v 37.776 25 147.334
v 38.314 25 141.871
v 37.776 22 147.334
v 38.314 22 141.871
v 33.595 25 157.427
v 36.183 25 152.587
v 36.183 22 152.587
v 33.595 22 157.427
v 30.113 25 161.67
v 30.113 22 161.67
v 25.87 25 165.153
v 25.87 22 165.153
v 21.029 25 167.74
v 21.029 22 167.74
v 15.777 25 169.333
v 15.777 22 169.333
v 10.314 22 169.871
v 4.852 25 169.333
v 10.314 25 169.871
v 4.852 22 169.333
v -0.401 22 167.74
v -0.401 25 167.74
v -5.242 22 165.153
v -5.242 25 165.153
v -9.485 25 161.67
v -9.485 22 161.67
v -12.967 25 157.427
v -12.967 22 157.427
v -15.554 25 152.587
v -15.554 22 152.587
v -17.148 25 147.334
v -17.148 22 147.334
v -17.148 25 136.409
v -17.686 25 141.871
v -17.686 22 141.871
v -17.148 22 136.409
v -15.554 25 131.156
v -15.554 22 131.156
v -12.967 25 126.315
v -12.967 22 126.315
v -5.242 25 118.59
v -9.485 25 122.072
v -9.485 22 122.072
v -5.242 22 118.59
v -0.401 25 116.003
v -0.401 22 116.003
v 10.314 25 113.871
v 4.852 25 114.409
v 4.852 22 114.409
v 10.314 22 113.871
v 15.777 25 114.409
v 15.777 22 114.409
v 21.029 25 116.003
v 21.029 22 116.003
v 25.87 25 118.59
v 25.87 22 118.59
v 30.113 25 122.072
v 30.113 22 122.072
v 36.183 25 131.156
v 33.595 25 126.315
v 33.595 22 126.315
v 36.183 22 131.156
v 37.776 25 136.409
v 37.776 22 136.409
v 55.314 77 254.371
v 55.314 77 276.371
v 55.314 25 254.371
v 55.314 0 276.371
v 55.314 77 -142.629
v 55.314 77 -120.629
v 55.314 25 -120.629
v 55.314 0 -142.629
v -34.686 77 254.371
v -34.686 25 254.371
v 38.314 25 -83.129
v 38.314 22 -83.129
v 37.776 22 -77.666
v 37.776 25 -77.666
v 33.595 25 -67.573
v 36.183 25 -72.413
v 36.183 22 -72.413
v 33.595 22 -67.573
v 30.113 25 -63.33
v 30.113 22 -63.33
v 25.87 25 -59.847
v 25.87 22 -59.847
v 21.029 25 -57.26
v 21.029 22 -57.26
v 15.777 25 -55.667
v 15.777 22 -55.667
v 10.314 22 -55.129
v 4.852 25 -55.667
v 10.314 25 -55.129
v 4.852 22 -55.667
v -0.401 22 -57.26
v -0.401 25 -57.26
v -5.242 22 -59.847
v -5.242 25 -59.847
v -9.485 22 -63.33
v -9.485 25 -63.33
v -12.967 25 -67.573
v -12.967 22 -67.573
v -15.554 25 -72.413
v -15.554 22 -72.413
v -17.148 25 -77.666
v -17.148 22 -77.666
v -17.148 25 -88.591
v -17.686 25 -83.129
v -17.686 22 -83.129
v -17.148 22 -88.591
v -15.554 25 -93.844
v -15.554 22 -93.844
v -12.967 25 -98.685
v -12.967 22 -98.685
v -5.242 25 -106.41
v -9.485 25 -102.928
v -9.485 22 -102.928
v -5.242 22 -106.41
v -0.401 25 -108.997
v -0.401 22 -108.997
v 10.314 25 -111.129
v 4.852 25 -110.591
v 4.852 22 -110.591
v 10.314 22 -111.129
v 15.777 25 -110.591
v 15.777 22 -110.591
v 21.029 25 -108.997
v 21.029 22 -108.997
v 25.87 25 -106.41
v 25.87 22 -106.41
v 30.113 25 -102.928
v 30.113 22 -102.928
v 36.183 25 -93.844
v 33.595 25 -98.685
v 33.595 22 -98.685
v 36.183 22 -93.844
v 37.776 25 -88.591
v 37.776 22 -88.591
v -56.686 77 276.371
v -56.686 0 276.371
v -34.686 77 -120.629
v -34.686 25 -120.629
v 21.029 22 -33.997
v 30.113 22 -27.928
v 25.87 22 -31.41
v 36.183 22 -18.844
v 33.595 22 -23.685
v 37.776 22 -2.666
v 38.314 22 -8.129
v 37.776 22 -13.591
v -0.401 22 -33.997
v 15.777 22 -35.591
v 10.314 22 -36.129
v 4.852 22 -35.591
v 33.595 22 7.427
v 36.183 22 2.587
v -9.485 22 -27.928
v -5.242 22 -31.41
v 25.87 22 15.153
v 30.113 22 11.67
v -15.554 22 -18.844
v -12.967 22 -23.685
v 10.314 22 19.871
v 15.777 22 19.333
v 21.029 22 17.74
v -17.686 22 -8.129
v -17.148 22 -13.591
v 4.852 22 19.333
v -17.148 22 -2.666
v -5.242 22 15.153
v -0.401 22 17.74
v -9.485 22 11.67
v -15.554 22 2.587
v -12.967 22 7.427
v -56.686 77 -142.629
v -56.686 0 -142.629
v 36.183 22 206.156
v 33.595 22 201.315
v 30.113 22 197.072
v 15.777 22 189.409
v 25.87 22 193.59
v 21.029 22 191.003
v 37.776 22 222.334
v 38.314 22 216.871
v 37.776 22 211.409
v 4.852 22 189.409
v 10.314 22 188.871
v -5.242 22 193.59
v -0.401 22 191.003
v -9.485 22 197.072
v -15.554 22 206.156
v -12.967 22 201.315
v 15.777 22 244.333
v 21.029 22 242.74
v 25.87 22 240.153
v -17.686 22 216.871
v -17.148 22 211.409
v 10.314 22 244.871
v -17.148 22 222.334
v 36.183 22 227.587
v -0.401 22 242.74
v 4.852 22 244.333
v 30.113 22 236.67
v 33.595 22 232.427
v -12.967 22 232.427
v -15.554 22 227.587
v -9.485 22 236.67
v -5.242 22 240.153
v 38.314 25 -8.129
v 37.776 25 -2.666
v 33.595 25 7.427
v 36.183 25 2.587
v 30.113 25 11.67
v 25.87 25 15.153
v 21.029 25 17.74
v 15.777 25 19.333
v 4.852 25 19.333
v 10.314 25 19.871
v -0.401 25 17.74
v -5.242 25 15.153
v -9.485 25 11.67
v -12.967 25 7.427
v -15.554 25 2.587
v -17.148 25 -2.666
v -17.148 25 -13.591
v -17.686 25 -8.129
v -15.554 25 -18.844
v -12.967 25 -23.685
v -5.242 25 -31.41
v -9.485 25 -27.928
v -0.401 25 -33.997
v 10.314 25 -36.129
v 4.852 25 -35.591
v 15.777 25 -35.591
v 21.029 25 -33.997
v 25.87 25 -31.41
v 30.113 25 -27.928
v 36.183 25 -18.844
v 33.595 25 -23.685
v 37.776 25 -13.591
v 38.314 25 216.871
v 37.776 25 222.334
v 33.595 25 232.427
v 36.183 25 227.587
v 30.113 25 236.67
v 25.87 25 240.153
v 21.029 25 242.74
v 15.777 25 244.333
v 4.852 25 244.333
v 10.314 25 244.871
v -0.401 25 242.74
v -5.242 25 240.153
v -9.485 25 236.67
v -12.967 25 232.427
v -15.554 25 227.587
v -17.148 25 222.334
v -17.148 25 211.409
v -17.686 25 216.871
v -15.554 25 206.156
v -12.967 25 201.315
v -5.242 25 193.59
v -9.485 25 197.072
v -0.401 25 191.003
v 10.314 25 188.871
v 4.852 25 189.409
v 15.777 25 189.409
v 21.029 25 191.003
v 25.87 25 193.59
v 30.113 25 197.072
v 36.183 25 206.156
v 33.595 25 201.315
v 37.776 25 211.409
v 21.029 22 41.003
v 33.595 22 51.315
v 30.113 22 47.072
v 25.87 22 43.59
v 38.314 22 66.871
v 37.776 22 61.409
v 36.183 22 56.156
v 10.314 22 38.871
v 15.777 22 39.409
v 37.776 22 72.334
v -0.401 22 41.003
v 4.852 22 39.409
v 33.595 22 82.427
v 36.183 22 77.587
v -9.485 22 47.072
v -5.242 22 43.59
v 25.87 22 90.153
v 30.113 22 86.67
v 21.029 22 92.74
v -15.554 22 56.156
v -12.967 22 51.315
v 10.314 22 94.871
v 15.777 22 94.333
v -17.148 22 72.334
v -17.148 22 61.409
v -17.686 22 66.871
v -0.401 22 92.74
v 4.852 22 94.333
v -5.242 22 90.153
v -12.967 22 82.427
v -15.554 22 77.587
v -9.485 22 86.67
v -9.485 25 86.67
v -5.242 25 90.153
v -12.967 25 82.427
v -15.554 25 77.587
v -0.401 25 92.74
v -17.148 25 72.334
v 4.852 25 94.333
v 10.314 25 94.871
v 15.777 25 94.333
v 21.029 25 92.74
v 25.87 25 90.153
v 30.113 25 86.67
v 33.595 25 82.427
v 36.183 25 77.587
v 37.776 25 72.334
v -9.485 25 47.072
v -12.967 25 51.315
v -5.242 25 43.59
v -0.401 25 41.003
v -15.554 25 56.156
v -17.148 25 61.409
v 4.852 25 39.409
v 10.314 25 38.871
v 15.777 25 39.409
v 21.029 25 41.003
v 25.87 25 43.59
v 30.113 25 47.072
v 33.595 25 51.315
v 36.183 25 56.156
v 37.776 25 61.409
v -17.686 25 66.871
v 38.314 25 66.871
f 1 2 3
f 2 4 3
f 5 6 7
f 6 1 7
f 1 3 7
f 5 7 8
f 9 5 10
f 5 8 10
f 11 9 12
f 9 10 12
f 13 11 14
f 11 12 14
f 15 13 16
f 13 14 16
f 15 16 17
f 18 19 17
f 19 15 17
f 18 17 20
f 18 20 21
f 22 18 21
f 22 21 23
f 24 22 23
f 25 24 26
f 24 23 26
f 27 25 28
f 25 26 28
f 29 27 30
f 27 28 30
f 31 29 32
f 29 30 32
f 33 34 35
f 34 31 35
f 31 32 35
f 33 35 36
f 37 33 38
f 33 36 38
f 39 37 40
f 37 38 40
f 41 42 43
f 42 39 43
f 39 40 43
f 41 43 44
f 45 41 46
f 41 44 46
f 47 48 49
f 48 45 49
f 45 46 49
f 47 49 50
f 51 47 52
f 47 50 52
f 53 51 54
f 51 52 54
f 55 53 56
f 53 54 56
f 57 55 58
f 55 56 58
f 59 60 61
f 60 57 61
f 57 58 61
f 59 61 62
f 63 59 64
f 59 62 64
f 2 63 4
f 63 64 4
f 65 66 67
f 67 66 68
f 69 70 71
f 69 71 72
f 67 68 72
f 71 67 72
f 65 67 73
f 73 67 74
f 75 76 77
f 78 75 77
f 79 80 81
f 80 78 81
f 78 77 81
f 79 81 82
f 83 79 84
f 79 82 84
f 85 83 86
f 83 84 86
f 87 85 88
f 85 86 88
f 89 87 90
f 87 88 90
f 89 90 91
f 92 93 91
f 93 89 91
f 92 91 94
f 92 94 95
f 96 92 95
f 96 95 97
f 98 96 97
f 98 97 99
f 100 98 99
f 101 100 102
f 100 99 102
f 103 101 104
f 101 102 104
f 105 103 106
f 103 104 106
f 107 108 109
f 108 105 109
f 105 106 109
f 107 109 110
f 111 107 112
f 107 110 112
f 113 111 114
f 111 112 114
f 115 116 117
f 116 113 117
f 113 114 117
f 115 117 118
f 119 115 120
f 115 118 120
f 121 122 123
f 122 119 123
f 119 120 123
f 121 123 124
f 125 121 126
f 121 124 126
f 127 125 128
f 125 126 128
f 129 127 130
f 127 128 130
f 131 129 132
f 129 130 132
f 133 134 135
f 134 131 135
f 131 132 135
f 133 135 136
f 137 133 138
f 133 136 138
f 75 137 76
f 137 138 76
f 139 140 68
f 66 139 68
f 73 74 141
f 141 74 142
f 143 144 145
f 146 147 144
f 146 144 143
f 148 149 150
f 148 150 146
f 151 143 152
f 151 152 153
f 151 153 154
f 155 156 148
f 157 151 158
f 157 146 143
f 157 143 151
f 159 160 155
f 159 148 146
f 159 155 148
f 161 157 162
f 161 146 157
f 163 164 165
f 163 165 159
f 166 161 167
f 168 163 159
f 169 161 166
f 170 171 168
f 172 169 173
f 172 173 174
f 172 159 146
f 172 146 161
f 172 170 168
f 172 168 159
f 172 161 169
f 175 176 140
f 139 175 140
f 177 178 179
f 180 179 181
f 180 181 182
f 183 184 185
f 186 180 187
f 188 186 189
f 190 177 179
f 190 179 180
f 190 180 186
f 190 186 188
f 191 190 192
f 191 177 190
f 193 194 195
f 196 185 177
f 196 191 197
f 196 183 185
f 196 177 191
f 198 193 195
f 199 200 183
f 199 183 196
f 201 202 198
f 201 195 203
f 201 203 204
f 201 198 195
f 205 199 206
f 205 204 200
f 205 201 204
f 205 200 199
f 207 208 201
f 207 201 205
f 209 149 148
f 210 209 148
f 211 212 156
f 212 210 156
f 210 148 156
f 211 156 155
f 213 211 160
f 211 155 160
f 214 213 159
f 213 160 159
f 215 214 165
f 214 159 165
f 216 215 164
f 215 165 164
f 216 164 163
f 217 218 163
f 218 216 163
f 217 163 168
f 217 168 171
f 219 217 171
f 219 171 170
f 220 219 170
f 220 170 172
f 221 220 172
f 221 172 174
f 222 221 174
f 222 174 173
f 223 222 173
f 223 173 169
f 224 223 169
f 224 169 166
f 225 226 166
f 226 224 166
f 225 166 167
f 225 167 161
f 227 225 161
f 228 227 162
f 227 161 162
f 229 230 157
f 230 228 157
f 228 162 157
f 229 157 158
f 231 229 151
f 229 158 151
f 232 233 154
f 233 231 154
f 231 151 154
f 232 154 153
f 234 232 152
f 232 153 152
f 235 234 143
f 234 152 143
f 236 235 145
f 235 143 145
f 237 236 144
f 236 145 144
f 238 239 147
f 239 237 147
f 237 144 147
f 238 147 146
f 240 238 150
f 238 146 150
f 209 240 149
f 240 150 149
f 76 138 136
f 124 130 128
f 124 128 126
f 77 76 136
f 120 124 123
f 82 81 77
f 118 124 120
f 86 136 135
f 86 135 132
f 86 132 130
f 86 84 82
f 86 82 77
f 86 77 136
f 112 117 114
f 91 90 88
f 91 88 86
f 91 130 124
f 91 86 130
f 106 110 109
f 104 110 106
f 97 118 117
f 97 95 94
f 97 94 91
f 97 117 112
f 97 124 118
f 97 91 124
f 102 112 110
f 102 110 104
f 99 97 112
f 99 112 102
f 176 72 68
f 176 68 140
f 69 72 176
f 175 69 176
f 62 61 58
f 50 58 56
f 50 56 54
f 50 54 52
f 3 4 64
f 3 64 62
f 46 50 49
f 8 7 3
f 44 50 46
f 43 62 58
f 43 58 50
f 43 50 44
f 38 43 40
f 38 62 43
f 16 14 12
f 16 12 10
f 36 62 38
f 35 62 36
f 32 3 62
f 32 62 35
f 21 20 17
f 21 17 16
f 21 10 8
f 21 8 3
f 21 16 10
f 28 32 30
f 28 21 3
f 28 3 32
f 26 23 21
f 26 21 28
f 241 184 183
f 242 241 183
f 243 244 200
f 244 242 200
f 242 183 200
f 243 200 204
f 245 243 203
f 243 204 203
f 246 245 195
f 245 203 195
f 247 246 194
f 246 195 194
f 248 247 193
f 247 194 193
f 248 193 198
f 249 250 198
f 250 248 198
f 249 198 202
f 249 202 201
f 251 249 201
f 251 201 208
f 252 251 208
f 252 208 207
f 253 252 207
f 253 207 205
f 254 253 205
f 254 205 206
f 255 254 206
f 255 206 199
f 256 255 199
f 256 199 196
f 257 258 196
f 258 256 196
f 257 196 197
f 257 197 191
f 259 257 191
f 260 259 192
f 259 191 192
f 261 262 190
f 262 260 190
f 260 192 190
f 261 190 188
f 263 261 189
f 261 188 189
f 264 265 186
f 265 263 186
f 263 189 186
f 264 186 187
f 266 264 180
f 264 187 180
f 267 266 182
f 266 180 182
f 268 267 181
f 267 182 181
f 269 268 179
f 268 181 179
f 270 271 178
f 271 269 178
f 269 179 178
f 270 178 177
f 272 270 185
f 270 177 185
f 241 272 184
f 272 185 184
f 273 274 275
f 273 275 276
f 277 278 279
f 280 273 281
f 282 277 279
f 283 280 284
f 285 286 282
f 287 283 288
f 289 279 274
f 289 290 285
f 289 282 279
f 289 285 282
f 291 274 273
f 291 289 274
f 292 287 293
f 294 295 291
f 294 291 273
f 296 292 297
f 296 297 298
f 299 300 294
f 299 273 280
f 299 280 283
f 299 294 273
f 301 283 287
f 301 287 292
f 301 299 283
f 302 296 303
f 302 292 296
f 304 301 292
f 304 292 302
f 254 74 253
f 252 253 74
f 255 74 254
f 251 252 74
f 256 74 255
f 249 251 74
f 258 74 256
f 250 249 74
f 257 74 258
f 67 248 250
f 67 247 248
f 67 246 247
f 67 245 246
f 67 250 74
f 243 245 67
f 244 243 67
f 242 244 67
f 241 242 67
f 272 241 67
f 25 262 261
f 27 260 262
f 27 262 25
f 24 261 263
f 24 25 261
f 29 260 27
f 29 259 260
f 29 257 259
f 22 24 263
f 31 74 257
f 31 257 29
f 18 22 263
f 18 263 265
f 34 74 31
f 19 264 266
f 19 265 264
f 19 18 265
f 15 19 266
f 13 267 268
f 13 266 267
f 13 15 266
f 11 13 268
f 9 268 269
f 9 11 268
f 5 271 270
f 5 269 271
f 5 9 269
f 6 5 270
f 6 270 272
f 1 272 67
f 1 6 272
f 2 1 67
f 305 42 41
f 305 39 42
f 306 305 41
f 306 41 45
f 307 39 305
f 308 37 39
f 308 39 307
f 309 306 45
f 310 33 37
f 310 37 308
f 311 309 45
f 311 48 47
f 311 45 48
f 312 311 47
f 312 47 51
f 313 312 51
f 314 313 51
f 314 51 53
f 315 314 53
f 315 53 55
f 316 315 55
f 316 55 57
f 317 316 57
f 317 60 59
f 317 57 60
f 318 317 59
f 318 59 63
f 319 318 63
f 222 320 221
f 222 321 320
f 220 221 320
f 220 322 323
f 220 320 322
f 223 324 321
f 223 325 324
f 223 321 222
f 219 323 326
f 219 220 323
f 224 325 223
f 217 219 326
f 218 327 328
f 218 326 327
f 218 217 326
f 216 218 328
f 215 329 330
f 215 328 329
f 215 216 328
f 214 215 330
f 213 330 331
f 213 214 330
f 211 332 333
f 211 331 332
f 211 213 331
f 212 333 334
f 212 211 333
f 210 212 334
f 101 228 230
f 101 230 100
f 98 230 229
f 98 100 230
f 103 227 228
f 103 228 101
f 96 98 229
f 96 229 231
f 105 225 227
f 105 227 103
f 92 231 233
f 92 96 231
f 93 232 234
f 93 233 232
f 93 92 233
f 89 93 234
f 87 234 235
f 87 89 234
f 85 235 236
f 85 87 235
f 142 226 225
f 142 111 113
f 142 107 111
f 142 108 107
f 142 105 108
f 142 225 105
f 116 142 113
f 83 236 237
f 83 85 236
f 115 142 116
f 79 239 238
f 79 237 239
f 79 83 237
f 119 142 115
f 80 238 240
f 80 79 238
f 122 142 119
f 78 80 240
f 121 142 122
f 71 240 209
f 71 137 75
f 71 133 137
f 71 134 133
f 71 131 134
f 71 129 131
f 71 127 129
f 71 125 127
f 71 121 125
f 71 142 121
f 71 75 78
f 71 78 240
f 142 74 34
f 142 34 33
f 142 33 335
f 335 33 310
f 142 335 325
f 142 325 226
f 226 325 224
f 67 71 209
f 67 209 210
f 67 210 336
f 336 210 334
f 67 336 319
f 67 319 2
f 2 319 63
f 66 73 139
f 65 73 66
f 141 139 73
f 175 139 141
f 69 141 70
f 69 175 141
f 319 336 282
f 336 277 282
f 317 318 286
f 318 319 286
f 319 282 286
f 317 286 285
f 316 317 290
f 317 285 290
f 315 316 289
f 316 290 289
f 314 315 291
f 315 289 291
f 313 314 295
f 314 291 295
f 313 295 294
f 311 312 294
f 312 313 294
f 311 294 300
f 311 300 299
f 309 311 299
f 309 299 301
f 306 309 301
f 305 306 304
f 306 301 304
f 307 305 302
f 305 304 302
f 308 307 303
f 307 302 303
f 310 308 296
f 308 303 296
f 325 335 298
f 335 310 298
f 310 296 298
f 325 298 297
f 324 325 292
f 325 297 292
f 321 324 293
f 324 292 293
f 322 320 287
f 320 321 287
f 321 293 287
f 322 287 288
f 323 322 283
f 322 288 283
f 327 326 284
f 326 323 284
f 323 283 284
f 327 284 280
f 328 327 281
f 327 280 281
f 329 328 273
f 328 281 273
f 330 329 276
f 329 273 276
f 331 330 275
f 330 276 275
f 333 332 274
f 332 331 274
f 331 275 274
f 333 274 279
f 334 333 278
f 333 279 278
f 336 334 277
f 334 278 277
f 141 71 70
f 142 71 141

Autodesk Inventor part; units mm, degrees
ref_plane "YZ Plane" through (0, 0, 0) normal (1, 0, 0) x (0, 1, 0)
ref_plane "XZ Plane" through (0, 0, 0) normal (0, 1, 0) x (-1, 0, 0)
ref_plane "XY Plane" through (0, 0, 0) normal (0, 0, 1) x (1, 0, 0)
sketch "Esquisse1" plane through (0, 0, 0) normal (0, 1, 0) x (-1, 0, 0)
  line L0 (56.6857, 276.3714) -> (-55.3143, 276.3714)
  line L1 (-55.3143, 276.3714) -> (-55.3143, -142.6286)
  line L2 (-55.3143, -142.6286) -> (56.6857, -142.6286)
  line L3 (56.6857, -142.6286) -> (56.6857, 276.3714)
  point P0 (0, 0)
  dimension "d0" = 112
  dimension "d1" = 419
extrude "Extrusion1" add sketch "Esquisse1" along normal blind 22
sketch "Esquisse2" plane through (0, 22, 0) normal (0, 1, 0) x (1, 0, 0)
  line L0 (-56.6857, 142.6286) -> (-56.6857, -276.3714) projected
  line L1 (55.3143, -276.3714) -> (55.3143, 142.6286) projected
  line L2 (-56.6857, -276.3714) -> (55.3143, -276.3714)
  line L3 (55.3143, -276.3714) -> (55.3143, -254.3714)
  line L4 (55.3143, -254.3714) -> (-56.6857, -254.3714)
  line L5 (-56.6857, -254.3714) -> (-56.6857, -276.3714)
  line L6 (55.3143, 142.6286) -> (-56.6857, 142.6286) projected
  line L7 (-56.6857, 142.6286) -> (55.3143, 142.6286)
  line L8 (55.3143, 142.6286) -> (55.3143, 120.6286)
  line L9 (55.3143, 120.6286) -> (-56.6857, 120.6286)
  line L10 (-56.6857, 120.6286) -> (-56.6857, 142.6286)
  line L11 (-56.6857, -254.3714) -> (-34.6857, -254.3714)
  line L12 (-34.6857, -254.3714) -> (-34.6857, 120.6286)
  line L13 (-34.6857, 120.6286) -> (-56.6857, 120.6286)
  line L14 (-56.6857, 120.6286) -> (-56.6857, -254.3714)
  point P0 (0, 0)
  dimension "d4" = 22
  dimension "d5" = 22
  dimension "d6" = 22
extrude "Extrusion2" add sketch "Esquisse2" along normal blind 55 contours L6 L1 L9 L0 | L9 L12 L4 L0 | L4 L1 L2 L0
sketch "Esquisse3" plane through (0, 22, 0) normal (0, 1, 0) x (1, 0, 0)
  line L0 (-34.6857, 120.6286) -> (-34.6857, -254.3714) projected
  line L1 (-34.6857, 120.6286) -> (55.3143, 120.6286) projected
  line L2 (-34.6857, -254.3714) -> (55.3143, -254.3714)
  line L3 (55.3143, -254.3714) -> (55.3143, 120.6286)
  line L4 (55.3143, 120.6286) -> (-34.6857, 120.6286)
  line L5 (-34.6857, 120.6286) -> (-34.6857, -254.3714)
  circle A0 centre (10.3143, 83.1286) radius 28
  circle A1 centre (10.3143, 8.1286) radius 28
  circle A2 centre (10.3143, -66.8714) radius 28
  circle A3 centre (10.3143, -141.8714) radius 28
  circle A4 centre (10.3143, -216.8714) radius 28
  point P0 (0, 0)
  dimension "d9" = 37.5
  dimension "d10" = 45
  dimension "d11" = 56
  dimension "d12" = 75
  dimension "d13" = 56
  dimension "d14" = 45
  dimension "d15" = 56
  dimension "d16" = 45
  dimension "d17" = 75
  dimension "d18" = 56
  dimension "d19" = 45
  dimension "d20" = 75
  dimension "d21" = 45
  dimension "d22" = 75
  dimension "d23" = 56
extrude "Extrusion3" add sketch "Esquisse3" along normal blind 3
properties part number "conteneur-boues"
